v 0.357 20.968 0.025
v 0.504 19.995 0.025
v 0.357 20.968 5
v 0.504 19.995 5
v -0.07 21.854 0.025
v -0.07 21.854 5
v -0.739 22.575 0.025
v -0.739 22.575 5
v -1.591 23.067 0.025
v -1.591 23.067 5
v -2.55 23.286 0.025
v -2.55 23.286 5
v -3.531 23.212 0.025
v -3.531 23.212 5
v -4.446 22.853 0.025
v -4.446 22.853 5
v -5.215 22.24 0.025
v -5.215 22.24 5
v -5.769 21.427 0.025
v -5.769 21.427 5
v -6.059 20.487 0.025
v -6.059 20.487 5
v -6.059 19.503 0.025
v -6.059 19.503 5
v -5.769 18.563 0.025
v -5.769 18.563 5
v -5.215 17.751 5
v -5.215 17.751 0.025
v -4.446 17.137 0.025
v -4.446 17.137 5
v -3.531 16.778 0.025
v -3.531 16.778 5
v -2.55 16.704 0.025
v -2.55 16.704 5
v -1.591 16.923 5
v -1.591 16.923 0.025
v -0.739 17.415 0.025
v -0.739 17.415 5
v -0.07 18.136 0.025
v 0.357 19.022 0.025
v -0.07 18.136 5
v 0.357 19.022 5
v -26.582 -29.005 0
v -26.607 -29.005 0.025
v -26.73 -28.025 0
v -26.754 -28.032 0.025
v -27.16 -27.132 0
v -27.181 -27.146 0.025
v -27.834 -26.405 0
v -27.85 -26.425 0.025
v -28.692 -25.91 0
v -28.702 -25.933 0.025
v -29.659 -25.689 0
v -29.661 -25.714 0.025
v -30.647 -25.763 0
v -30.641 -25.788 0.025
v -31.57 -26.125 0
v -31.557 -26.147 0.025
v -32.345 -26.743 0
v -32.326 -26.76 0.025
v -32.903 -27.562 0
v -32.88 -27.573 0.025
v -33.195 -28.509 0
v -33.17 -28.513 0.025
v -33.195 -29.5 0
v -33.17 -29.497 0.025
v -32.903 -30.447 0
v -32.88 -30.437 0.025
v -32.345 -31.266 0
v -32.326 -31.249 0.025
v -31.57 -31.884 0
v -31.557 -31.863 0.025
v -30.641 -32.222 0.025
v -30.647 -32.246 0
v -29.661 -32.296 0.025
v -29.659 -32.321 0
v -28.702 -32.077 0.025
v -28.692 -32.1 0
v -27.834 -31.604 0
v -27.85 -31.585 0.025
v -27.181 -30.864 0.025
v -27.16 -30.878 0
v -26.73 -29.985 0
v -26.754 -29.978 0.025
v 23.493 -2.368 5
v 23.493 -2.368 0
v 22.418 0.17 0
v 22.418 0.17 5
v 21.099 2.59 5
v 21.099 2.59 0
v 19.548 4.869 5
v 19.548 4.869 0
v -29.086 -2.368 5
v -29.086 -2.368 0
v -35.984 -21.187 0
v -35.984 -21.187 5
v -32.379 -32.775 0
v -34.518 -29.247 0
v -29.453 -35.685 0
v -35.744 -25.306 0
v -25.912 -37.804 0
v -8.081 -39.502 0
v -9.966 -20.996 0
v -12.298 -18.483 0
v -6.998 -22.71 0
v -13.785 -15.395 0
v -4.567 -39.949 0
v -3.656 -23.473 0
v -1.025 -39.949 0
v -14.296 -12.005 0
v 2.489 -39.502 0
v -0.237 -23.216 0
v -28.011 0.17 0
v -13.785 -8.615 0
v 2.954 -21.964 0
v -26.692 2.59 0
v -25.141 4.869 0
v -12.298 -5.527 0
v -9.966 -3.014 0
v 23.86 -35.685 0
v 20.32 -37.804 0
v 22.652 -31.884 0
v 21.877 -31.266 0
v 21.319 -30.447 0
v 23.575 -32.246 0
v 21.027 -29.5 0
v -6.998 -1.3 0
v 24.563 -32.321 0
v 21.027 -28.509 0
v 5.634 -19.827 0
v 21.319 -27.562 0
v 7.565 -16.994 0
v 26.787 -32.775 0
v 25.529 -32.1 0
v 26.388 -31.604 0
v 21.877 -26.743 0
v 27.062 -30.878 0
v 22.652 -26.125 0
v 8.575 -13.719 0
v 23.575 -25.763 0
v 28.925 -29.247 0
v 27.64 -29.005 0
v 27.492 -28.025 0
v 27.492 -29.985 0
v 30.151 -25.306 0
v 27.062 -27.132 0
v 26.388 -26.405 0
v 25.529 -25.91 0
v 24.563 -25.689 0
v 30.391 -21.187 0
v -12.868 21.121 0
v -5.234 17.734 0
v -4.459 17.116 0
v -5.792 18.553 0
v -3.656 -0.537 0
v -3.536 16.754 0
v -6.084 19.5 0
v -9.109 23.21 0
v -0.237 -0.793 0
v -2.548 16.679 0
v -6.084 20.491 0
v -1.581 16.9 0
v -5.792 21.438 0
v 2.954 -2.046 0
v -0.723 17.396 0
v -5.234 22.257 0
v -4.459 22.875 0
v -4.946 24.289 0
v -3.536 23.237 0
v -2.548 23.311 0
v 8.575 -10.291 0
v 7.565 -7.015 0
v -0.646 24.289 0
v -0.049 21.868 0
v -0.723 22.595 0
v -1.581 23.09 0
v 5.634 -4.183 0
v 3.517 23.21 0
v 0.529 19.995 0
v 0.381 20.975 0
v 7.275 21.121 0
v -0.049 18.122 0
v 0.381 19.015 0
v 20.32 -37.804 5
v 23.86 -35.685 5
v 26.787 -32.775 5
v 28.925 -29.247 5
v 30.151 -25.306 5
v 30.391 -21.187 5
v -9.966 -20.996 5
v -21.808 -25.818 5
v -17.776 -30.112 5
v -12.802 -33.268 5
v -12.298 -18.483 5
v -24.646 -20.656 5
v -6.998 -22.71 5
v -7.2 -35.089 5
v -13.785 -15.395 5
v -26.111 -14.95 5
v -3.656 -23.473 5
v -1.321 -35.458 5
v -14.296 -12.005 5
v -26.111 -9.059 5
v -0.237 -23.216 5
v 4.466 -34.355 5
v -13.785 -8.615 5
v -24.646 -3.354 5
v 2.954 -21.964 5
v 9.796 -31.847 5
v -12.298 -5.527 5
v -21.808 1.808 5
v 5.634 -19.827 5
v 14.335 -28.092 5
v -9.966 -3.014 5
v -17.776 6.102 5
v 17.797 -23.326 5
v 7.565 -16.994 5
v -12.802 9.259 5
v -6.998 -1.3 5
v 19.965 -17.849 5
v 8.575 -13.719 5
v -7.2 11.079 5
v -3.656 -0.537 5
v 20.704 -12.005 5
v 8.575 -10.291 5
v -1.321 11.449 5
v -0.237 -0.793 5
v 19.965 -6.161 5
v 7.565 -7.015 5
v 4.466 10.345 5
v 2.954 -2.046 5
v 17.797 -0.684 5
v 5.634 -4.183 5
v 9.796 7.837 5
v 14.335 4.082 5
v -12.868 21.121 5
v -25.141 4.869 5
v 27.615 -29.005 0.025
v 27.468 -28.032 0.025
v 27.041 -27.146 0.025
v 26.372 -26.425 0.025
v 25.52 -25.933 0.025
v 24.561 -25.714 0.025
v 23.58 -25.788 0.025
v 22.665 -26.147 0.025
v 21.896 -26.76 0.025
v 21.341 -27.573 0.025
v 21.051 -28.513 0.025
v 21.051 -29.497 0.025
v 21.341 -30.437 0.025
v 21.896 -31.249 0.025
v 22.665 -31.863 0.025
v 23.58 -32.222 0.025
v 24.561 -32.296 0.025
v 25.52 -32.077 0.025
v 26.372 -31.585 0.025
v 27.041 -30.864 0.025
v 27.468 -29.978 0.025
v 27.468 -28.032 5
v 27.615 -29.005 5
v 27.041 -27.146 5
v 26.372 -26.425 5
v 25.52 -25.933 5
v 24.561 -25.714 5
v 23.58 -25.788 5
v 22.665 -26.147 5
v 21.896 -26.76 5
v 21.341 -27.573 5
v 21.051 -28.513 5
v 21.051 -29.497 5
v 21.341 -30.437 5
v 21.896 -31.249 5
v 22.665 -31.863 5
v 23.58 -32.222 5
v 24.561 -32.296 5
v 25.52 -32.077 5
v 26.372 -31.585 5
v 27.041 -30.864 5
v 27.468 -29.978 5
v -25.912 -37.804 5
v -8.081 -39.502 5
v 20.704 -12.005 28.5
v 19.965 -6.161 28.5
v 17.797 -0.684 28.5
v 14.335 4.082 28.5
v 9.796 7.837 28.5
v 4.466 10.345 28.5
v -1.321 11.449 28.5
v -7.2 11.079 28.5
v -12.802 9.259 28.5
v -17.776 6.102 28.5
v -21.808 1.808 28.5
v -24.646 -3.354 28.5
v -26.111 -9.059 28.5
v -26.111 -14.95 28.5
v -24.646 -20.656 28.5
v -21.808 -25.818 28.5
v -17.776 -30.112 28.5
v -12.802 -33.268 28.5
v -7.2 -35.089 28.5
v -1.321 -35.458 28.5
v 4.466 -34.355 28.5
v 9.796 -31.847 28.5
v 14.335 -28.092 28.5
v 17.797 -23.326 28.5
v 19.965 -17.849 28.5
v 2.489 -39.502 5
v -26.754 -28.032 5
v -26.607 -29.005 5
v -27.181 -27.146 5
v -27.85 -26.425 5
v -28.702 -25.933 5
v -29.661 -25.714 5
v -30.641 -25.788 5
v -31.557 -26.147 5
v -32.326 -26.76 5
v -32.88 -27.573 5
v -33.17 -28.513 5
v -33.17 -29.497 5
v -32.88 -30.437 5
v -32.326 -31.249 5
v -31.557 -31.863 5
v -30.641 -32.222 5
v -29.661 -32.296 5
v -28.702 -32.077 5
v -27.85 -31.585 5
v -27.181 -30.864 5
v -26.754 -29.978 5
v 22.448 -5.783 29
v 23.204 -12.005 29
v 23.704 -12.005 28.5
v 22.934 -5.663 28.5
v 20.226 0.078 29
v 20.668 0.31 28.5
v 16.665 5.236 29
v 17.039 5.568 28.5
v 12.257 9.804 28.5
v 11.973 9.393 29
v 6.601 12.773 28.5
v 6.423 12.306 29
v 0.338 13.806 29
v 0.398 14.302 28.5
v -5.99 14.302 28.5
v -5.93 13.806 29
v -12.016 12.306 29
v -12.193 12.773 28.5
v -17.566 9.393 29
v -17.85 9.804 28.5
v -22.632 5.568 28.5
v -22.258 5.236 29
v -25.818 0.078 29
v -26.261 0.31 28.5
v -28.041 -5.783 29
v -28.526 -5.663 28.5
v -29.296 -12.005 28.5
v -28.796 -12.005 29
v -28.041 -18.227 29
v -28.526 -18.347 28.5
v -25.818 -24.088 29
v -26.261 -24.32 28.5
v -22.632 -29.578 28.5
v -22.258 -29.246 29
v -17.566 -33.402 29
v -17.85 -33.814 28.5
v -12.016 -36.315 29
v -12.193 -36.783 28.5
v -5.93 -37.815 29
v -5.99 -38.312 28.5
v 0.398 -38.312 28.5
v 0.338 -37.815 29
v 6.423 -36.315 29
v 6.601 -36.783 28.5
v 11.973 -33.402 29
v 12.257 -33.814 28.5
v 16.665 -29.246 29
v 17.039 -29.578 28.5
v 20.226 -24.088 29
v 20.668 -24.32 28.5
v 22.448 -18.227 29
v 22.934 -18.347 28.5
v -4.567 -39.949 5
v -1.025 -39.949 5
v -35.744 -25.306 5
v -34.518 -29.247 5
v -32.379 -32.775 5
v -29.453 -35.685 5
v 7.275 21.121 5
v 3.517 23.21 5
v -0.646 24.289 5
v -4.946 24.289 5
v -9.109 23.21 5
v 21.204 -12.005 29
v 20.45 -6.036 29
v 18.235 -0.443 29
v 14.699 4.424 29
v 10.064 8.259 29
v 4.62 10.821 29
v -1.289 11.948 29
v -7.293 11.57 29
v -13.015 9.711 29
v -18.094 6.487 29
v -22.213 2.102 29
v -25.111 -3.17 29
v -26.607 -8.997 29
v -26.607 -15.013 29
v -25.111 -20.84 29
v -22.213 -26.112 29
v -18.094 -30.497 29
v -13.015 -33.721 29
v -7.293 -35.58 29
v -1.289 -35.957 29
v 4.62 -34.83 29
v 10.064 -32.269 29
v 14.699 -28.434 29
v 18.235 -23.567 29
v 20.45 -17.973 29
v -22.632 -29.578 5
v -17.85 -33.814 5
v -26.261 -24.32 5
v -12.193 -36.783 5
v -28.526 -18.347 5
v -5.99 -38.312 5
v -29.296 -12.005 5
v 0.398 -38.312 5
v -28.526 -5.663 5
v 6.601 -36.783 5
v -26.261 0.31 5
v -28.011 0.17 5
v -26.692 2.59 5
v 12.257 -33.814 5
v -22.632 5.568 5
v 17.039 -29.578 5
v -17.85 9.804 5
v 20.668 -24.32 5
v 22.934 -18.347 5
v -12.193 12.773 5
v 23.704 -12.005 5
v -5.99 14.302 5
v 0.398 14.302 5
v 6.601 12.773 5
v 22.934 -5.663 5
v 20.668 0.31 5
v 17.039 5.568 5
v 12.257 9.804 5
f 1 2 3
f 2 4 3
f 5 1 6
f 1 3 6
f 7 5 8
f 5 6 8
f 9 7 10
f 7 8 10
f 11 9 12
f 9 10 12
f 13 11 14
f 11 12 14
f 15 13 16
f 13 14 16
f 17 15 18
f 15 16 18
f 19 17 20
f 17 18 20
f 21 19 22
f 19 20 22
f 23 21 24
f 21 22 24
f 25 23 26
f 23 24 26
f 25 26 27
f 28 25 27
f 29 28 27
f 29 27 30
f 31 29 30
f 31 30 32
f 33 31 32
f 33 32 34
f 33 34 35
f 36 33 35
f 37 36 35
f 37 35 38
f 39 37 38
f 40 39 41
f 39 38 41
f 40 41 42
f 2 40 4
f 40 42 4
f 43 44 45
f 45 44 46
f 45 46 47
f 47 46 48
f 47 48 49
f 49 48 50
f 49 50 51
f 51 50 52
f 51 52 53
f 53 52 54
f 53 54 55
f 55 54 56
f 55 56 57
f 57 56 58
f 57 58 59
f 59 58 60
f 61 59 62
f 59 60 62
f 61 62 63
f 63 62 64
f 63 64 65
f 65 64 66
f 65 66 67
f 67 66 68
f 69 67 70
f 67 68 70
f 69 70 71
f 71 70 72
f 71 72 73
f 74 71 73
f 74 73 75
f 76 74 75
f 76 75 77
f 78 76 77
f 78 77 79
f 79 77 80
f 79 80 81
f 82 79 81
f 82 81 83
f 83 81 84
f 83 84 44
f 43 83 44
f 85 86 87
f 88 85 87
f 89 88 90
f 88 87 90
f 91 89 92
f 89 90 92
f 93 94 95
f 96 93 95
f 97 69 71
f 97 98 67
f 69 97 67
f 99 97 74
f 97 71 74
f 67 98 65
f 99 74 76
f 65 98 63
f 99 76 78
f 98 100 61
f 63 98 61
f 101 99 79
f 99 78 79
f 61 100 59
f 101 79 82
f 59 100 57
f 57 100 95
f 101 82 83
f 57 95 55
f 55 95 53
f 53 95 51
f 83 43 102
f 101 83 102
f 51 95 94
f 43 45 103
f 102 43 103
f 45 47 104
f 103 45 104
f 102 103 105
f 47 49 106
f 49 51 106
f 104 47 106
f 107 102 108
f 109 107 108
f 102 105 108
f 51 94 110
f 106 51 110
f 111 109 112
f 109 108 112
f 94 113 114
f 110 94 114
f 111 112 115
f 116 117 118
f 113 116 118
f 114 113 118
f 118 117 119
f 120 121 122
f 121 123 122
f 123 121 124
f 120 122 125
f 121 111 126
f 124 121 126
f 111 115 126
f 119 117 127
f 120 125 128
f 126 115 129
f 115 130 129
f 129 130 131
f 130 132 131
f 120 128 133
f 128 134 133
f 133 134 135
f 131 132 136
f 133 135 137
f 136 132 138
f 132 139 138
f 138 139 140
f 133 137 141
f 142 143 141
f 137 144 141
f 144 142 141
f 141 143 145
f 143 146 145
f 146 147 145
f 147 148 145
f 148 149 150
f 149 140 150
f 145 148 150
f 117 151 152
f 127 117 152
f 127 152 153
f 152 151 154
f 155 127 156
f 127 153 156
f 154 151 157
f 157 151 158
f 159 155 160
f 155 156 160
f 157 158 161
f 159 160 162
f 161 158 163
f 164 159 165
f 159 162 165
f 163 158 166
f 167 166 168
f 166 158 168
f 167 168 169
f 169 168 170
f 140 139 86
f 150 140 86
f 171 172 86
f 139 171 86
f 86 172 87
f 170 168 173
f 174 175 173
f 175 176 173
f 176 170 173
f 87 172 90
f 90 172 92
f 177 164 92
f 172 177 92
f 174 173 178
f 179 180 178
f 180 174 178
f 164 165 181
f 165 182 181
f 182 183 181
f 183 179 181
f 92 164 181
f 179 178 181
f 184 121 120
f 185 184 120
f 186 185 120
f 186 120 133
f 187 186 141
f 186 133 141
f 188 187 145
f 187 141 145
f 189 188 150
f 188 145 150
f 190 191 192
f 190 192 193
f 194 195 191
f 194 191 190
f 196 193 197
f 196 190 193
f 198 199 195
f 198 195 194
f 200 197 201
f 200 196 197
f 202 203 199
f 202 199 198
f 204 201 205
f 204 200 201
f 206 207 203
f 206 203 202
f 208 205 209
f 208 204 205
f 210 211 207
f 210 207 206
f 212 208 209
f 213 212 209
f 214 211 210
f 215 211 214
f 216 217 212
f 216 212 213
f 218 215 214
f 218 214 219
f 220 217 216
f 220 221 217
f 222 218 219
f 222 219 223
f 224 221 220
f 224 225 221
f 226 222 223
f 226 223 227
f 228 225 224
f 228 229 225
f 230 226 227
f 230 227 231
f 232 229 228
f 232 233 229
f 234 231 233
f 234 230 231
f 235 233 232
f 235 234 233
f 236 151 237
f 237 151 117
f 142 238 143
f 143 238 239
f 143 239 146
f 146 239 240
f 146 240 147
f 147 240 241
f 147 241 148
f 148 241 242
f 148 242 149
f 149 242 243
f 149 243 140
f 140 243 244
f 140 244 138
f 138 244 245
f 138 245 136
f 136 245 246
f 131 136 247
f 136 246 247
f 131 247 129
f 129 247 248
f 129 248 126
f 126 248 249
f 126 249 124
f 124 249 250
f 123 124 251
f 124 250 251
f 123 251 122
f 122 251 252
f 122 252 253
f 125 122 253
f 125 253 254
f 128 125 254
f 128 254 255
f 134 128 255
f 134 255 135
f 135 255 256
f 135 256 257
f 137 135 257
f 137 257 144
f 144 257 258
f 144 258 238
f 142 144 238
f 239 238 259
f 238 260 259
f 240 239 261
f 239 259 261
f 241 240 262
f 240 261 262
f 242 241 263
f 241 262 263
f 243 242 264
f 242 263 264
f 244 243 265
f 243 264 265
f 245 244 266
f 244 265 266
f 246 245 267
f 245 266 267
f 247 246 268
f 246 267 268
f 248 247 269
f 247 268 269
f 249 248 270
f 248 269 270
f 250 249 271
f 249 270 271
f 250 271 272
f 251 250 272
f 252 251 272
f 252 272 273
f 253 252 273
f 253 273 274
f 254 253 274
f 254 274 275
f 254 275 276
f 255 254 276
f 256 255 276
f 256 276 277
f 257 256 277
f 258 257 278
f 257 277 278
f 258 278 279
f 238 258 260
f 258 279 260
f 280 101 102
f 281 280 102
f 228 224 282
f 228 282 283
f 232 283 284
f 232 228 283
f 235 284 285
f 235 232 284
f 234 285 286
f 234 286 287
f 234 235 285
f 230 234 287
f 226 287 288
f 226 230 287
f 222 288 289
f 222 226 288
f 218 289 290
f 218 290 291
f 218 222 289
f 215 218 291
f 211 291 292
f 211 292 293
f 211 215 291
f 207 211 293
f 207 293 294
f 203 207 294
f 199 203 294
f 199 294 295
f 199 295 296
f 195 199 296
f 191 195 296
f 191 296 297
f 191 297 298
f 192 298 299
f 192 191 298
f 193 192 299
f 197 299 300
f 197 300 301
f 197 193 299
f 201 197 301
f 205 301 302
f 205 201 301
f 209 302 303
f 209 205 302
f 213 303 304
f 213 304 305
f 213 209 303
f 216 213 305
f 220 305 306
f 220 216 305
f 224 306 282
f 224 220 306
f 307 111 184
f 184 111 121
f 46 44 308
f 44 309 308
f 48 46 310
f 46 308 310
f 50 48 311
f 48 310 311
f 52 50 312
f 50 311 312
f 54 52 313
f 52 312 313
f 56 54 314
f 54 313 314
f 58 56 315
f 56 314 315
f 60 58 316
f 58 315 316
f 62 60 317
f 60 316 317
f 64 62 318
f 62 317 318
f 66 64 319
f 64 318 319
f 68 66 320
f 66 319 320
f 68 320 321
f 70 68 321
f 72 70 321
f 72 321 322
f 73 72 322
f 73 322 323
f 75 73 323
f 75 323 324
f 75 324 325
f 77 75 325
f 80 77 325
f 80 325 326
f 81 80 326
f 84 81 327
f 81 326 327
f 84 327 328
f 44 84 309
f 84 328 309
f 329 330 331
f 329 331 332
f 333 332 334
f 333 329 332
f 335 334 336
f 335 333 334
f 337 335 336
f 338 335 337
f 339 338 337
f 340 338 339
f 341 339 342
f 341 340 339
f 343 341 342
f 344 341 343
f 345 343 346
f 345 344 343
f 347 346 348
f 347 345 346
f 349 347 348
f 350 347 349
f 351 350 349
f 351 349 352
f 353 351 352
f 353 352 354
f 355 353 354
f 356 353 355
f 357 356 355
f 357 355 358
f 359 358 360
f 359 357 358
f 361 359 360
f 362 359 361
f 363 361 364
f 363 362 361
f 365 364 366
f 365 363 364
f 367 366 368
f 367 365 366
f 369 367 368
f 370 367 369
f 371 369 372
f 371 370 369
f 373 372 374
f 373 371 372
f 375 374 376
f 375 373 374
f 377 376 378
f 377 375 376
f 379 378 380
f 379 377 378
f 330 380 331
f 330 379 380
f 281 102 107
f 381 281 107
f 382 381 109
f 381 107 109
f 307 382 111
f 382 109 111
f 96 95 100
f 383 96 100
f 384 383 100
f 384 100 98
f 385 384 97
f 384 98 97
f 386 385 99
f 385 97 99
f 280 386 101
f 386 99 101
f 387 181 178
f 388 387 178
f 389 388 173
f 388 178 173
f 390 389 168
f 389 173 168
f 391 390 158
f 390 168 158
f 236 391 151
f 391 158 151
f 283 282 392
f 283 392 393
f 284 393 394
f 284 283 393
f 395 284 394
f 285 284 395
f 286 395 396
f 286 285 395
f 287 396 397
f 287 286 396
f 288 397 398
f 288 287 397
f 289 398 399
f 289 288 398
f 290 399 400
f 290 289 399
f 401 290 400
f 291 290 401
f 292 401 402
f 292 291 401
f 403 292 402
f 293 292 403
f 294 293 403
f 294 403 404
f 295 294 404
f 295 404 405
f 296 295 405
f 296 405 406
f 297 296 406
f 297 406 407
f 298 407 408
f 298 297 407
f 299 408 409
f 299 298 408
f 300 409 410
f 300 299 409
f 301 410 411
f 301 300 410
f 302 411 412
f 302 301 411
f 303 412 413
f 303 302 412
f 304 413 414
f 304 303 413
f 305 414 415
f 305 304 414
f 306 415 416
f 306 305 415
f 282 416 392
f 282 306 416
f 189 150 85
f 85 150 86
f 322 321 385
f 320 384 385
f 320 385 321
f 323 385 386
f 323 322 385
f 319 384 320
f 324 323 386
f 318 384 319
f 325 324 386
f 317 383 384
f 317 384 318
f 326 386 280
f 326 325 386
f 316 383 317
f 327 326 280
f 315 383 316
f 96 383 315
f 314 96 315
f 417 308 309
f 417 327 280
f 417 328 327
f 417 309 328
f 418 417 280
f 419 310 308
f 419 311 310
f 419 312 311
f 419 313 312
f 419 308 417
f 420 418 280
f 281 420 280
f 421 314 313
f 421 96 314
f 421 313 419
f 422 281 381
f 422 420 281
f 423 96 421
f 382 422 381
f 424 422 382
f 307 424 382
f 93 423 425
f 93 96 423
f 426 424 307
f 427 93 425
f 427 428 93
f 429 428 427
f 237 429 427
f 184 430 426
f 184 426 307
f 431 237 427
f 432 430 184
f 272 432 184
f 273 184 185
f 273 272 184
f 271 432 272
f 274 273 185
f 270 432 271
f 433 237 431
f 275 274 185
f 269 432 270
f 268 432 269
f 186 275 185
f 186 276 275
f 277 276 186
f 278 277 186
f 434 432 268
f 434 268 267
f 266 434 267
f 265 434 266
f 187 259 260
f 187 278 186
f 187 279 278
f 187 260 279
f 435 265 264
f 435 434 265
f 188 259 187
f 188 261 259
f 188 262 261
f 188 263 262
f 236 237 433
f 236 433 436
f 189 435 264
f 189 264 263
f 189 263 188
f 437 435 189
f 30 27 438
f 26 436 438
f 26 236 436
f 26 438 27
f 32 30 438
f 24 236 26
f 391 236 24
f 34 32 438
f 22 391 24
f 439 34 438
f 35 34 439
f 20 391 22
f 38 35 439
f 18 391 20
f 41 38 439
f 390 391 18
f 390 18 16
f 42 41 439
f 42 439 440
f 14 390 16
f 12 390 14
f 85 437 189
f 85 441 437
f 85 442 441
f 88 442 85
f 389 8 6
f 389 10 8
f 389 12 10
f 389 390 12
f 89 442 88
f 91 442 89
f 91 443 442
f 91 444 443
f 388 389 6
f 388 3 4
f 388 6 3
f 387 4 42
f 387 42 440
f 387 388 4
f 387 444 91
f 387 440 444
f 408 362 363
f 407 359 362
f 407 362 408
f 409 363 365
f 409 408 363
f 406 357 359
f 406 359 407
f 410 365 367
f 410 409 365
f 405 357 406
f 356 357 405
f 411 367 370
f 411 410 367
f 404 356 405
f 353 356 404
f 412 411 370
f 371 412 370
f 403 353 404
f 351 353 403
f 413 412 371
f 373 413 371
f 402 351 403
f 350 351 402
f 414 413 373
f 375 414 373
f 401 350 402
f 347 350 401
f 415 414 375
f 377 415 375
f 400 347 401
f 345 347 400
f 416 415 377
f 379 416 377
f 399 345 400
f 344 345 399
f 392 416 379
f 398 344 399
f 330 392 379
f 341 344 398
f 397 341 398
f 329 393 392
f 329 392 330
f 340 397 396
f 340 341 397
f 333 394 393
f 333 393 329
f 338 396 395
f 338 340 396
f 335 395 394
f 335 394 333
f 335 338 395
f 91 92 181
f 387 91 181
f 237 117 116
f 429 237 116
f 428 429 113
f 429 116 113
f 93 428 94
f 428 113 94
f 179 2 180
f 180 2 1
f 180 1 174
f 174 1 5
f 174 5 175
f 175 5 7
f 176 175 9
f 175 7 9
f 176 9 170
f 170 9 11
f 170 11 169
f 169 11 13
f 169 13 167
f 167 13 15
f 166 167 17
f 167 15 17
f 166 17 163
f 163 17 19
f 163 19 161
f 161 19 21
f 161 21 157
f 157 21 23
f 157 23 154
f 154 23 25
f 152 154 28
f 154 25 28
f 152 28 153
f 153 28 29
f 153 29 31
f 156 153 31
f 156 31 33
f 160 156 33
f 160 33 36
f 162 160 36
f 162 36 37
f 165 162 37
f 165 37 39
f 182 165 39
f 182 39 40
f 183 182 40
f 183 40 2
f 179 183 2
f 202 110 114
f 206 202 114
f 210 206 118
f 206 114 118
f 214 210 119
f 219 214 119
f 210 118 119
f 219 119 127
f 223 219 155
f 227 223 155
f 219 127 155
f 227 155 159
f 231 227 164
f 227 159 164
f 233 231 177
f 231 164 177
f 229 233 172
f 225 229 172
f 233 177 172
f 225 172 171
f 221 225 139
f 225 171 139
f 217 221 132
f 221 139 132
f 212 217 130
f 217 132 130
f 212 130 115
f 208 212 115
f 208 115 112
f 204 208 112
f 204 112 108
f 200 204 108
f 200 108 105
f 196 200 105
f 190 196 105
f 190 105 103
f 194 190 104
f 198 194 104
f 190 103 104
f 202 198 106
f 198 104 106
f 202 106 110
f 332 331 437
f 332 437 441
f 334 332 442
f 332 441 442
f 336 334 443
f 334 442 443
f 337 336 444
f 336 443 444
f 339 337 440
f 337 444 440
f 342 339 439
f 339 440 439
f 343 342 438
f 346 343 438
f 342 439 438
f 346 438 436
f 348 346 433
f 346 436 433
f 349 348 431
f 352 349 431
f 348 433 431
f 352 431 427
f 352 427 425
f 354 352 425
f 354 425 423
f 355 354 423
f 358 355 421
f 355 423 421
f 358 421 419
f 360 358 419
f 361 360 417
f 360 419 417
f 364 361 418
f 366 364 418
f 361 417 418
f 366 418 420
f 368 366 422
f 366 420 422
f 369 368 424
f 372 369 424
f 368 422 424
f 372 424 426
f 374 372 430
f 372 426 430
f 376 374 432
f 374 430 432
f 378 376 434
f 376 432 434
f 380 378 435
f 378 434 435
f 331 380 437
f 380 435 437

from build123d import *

# Parameters (mm, degrees)
ESTRUSIONE_ESTRUSIONE1_DEPTH   = 5
FORO_PER_VITE_M6_1_D           = 6.6
FORO_PER_VITE_M6_1_CSINK_D     = 6.65
FORO_PER_VITE_M6_1_CSINK_ANGLE = 90
SCHIZZO4_R                     = 26.5
SCHIZZO4_R_2                   = 23.5
ESTRUSIONE_ESTRUSIONE2_DEPTH   = 24
SCHIZZO5_R                     = 11.5
TAGLIO_ESTRUSIONE1_DEPTH       = 5
SMUSSO1_SIZE                   = 0.5


with BuildPart() as part:
    # Schizzo1 → Estrusione-Estrusione1 (new body)
    with BuildSketch(Plane.XY):
        with BuildLine():
            Line((2.4885721, -39.50156014), (20.319683996, -37.803546229))
            ThreePointArc((20.319683996, -37.803546229), (27.963406237, -31.07606674), (30.391301643, -21.187143955))
            Line((30.391301643, -21.187143955), (23.49327463, -2.368382239))
            ThreePointArc((23.49327463, -2.368382239), (21.78857361, 1.396167849), (19.548342312, 4.868804695))
            Line((19.548342312, 4.868804695), (7.275368714, 21.121066322))
            ThreePointArc((7.275368714, 21.121066322), (-2.796248933, 24.425719741), (-12.86786658, 21.121066322))
            Line((-12.86786658, 21.121066322), (-25.140840178, 4.868804695))
            ThreePointArc((-25.140840178, 4.868804695), (-27.381071476, 1.396167849), (-29.085772496, -2.368382239))
            Line((-29.085772496, -2.368382239), (-35.983799509, -21.187143955))
            ThreePointArc((-35.983799509, -21.187143955), (-33.555904103, -31.07606674), (-25.912181862, -37.803546229))
            Line((-25.912181862, -37.803546229), (-8.081069967, -39.50156014))
            ThreePointArc((-8.081069967, -39.50156014), (-2.796248933, -40.00482094), (2.4885721, -39.50156014))
        make_face()
    extrude(amount=ESTRUSIONE_ESTRUSIONE1_DEPTH)

    # Foro per Vite M6-1 (through all)
    with Locations(Plane(origin=(0, 0, 0), x_dir=(-1, 0, 0), z_dir=(0, 0, -1))):
        with Locations((2.796248933, 19.99517906), (29.907132357, -29.00482094), (-24.31463449, -29.00482094)):
            CounterSinkHole(FORO_PER_VITE_M6_1_D / 2, FORO_PER_VITE_M6_1_CSINK_D / 2, counter_sink_angle=FORO_PER_VITE_M6_1_CSINK_ANGLE)

    # Schizzo4 → Estrusione-Estrusione2 (add)
    with BuildSketch(Plane.XY.offset(5)):
        with Locations((-2.796248933, -12.00482094)):
            Circle(SCHIZZO4_R)
        with Locations((-2.796248933, -12.00482094)):
            Circle(SCHIZZO4_R_2, mode=Mode.SUBTRACT)
    extrude(amount=ESTRUSIONE_ESTRUSIONE2_DEPTH)

    # Schizzo5 → Taglio-Estrusione1 (cut)
    with BuildSketch(Plane(origin=(0, 0, 0), x_dir=(-1, 0, 0), z_dir=(0, 0, -1))):
        with Locations((2.796248933, -12.00482094)):
            Circle(SCHIZZO5_R)
    extrude(amount=-TAGLIO_ESTRUSIONE1_DEPTH, mode=Mode.SUBTRACT)

    # Smusso1
    smusso1_edges = [part.edges().sort_by_distance(p)[0] for p in [
        (-29.296248933, -12.00482094, 29),
        (-26.296248933, -12.00482094, 29),
    ]]
    chamfer(smusso1_edges, length=SMUSSO1_SIZE)


solid = part.part
